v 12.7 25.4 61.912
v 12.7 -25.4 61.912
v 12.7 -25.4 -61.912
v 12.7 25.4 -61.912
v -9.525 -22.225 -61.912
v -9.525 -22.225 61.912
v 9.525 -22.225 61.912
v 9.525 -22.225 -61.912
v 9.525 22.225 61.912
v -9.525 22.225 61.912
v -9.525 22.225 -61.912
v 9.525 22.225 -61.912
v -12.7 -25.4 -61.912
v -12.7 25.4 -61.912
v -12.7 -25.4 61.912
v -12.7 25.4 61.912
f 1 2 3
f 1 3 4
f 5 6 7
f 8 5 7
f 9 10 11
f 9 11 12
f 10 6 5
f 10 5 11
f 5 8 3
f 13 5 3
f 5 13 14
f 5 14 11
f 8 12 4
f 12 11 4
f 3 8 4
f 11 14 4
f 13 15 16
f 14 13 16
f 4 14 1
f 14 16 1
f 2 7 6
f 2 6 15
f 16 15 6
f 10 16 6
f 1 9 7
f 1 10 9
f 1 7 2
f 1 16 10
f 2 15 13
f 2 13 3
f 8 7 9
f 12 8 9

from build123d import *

# Parameters (mm, degrees)
SKETCH1_W           = 25.4
SKETCH1_H           = 50.8
BOSS_EXTRUDE1_DEPTH = 61.9125
SHELL1_T            = -3.175


with BuildPart() as part:
    # Sketch1 → Boss-Extrude1 (new body, symmetric)
    with BuildSketch(Plane.XY):
        Rectangle(SKETCH1_W, SKETCH1_H)
    extrude(amount=BOSS_EXTRUDE1_DEPTH, both=True)

    # Shell1
    shell1_openings = [part.faces().sort_by_distance(p)[0] for p in [
        (0, 0, 61.9125),
        (0, 0, -61.9125),
    ]]
    offset(amount=SHELL1_T, openings=shell1_openings, kind=Kind.INTERSECTION)


solid = part.part
